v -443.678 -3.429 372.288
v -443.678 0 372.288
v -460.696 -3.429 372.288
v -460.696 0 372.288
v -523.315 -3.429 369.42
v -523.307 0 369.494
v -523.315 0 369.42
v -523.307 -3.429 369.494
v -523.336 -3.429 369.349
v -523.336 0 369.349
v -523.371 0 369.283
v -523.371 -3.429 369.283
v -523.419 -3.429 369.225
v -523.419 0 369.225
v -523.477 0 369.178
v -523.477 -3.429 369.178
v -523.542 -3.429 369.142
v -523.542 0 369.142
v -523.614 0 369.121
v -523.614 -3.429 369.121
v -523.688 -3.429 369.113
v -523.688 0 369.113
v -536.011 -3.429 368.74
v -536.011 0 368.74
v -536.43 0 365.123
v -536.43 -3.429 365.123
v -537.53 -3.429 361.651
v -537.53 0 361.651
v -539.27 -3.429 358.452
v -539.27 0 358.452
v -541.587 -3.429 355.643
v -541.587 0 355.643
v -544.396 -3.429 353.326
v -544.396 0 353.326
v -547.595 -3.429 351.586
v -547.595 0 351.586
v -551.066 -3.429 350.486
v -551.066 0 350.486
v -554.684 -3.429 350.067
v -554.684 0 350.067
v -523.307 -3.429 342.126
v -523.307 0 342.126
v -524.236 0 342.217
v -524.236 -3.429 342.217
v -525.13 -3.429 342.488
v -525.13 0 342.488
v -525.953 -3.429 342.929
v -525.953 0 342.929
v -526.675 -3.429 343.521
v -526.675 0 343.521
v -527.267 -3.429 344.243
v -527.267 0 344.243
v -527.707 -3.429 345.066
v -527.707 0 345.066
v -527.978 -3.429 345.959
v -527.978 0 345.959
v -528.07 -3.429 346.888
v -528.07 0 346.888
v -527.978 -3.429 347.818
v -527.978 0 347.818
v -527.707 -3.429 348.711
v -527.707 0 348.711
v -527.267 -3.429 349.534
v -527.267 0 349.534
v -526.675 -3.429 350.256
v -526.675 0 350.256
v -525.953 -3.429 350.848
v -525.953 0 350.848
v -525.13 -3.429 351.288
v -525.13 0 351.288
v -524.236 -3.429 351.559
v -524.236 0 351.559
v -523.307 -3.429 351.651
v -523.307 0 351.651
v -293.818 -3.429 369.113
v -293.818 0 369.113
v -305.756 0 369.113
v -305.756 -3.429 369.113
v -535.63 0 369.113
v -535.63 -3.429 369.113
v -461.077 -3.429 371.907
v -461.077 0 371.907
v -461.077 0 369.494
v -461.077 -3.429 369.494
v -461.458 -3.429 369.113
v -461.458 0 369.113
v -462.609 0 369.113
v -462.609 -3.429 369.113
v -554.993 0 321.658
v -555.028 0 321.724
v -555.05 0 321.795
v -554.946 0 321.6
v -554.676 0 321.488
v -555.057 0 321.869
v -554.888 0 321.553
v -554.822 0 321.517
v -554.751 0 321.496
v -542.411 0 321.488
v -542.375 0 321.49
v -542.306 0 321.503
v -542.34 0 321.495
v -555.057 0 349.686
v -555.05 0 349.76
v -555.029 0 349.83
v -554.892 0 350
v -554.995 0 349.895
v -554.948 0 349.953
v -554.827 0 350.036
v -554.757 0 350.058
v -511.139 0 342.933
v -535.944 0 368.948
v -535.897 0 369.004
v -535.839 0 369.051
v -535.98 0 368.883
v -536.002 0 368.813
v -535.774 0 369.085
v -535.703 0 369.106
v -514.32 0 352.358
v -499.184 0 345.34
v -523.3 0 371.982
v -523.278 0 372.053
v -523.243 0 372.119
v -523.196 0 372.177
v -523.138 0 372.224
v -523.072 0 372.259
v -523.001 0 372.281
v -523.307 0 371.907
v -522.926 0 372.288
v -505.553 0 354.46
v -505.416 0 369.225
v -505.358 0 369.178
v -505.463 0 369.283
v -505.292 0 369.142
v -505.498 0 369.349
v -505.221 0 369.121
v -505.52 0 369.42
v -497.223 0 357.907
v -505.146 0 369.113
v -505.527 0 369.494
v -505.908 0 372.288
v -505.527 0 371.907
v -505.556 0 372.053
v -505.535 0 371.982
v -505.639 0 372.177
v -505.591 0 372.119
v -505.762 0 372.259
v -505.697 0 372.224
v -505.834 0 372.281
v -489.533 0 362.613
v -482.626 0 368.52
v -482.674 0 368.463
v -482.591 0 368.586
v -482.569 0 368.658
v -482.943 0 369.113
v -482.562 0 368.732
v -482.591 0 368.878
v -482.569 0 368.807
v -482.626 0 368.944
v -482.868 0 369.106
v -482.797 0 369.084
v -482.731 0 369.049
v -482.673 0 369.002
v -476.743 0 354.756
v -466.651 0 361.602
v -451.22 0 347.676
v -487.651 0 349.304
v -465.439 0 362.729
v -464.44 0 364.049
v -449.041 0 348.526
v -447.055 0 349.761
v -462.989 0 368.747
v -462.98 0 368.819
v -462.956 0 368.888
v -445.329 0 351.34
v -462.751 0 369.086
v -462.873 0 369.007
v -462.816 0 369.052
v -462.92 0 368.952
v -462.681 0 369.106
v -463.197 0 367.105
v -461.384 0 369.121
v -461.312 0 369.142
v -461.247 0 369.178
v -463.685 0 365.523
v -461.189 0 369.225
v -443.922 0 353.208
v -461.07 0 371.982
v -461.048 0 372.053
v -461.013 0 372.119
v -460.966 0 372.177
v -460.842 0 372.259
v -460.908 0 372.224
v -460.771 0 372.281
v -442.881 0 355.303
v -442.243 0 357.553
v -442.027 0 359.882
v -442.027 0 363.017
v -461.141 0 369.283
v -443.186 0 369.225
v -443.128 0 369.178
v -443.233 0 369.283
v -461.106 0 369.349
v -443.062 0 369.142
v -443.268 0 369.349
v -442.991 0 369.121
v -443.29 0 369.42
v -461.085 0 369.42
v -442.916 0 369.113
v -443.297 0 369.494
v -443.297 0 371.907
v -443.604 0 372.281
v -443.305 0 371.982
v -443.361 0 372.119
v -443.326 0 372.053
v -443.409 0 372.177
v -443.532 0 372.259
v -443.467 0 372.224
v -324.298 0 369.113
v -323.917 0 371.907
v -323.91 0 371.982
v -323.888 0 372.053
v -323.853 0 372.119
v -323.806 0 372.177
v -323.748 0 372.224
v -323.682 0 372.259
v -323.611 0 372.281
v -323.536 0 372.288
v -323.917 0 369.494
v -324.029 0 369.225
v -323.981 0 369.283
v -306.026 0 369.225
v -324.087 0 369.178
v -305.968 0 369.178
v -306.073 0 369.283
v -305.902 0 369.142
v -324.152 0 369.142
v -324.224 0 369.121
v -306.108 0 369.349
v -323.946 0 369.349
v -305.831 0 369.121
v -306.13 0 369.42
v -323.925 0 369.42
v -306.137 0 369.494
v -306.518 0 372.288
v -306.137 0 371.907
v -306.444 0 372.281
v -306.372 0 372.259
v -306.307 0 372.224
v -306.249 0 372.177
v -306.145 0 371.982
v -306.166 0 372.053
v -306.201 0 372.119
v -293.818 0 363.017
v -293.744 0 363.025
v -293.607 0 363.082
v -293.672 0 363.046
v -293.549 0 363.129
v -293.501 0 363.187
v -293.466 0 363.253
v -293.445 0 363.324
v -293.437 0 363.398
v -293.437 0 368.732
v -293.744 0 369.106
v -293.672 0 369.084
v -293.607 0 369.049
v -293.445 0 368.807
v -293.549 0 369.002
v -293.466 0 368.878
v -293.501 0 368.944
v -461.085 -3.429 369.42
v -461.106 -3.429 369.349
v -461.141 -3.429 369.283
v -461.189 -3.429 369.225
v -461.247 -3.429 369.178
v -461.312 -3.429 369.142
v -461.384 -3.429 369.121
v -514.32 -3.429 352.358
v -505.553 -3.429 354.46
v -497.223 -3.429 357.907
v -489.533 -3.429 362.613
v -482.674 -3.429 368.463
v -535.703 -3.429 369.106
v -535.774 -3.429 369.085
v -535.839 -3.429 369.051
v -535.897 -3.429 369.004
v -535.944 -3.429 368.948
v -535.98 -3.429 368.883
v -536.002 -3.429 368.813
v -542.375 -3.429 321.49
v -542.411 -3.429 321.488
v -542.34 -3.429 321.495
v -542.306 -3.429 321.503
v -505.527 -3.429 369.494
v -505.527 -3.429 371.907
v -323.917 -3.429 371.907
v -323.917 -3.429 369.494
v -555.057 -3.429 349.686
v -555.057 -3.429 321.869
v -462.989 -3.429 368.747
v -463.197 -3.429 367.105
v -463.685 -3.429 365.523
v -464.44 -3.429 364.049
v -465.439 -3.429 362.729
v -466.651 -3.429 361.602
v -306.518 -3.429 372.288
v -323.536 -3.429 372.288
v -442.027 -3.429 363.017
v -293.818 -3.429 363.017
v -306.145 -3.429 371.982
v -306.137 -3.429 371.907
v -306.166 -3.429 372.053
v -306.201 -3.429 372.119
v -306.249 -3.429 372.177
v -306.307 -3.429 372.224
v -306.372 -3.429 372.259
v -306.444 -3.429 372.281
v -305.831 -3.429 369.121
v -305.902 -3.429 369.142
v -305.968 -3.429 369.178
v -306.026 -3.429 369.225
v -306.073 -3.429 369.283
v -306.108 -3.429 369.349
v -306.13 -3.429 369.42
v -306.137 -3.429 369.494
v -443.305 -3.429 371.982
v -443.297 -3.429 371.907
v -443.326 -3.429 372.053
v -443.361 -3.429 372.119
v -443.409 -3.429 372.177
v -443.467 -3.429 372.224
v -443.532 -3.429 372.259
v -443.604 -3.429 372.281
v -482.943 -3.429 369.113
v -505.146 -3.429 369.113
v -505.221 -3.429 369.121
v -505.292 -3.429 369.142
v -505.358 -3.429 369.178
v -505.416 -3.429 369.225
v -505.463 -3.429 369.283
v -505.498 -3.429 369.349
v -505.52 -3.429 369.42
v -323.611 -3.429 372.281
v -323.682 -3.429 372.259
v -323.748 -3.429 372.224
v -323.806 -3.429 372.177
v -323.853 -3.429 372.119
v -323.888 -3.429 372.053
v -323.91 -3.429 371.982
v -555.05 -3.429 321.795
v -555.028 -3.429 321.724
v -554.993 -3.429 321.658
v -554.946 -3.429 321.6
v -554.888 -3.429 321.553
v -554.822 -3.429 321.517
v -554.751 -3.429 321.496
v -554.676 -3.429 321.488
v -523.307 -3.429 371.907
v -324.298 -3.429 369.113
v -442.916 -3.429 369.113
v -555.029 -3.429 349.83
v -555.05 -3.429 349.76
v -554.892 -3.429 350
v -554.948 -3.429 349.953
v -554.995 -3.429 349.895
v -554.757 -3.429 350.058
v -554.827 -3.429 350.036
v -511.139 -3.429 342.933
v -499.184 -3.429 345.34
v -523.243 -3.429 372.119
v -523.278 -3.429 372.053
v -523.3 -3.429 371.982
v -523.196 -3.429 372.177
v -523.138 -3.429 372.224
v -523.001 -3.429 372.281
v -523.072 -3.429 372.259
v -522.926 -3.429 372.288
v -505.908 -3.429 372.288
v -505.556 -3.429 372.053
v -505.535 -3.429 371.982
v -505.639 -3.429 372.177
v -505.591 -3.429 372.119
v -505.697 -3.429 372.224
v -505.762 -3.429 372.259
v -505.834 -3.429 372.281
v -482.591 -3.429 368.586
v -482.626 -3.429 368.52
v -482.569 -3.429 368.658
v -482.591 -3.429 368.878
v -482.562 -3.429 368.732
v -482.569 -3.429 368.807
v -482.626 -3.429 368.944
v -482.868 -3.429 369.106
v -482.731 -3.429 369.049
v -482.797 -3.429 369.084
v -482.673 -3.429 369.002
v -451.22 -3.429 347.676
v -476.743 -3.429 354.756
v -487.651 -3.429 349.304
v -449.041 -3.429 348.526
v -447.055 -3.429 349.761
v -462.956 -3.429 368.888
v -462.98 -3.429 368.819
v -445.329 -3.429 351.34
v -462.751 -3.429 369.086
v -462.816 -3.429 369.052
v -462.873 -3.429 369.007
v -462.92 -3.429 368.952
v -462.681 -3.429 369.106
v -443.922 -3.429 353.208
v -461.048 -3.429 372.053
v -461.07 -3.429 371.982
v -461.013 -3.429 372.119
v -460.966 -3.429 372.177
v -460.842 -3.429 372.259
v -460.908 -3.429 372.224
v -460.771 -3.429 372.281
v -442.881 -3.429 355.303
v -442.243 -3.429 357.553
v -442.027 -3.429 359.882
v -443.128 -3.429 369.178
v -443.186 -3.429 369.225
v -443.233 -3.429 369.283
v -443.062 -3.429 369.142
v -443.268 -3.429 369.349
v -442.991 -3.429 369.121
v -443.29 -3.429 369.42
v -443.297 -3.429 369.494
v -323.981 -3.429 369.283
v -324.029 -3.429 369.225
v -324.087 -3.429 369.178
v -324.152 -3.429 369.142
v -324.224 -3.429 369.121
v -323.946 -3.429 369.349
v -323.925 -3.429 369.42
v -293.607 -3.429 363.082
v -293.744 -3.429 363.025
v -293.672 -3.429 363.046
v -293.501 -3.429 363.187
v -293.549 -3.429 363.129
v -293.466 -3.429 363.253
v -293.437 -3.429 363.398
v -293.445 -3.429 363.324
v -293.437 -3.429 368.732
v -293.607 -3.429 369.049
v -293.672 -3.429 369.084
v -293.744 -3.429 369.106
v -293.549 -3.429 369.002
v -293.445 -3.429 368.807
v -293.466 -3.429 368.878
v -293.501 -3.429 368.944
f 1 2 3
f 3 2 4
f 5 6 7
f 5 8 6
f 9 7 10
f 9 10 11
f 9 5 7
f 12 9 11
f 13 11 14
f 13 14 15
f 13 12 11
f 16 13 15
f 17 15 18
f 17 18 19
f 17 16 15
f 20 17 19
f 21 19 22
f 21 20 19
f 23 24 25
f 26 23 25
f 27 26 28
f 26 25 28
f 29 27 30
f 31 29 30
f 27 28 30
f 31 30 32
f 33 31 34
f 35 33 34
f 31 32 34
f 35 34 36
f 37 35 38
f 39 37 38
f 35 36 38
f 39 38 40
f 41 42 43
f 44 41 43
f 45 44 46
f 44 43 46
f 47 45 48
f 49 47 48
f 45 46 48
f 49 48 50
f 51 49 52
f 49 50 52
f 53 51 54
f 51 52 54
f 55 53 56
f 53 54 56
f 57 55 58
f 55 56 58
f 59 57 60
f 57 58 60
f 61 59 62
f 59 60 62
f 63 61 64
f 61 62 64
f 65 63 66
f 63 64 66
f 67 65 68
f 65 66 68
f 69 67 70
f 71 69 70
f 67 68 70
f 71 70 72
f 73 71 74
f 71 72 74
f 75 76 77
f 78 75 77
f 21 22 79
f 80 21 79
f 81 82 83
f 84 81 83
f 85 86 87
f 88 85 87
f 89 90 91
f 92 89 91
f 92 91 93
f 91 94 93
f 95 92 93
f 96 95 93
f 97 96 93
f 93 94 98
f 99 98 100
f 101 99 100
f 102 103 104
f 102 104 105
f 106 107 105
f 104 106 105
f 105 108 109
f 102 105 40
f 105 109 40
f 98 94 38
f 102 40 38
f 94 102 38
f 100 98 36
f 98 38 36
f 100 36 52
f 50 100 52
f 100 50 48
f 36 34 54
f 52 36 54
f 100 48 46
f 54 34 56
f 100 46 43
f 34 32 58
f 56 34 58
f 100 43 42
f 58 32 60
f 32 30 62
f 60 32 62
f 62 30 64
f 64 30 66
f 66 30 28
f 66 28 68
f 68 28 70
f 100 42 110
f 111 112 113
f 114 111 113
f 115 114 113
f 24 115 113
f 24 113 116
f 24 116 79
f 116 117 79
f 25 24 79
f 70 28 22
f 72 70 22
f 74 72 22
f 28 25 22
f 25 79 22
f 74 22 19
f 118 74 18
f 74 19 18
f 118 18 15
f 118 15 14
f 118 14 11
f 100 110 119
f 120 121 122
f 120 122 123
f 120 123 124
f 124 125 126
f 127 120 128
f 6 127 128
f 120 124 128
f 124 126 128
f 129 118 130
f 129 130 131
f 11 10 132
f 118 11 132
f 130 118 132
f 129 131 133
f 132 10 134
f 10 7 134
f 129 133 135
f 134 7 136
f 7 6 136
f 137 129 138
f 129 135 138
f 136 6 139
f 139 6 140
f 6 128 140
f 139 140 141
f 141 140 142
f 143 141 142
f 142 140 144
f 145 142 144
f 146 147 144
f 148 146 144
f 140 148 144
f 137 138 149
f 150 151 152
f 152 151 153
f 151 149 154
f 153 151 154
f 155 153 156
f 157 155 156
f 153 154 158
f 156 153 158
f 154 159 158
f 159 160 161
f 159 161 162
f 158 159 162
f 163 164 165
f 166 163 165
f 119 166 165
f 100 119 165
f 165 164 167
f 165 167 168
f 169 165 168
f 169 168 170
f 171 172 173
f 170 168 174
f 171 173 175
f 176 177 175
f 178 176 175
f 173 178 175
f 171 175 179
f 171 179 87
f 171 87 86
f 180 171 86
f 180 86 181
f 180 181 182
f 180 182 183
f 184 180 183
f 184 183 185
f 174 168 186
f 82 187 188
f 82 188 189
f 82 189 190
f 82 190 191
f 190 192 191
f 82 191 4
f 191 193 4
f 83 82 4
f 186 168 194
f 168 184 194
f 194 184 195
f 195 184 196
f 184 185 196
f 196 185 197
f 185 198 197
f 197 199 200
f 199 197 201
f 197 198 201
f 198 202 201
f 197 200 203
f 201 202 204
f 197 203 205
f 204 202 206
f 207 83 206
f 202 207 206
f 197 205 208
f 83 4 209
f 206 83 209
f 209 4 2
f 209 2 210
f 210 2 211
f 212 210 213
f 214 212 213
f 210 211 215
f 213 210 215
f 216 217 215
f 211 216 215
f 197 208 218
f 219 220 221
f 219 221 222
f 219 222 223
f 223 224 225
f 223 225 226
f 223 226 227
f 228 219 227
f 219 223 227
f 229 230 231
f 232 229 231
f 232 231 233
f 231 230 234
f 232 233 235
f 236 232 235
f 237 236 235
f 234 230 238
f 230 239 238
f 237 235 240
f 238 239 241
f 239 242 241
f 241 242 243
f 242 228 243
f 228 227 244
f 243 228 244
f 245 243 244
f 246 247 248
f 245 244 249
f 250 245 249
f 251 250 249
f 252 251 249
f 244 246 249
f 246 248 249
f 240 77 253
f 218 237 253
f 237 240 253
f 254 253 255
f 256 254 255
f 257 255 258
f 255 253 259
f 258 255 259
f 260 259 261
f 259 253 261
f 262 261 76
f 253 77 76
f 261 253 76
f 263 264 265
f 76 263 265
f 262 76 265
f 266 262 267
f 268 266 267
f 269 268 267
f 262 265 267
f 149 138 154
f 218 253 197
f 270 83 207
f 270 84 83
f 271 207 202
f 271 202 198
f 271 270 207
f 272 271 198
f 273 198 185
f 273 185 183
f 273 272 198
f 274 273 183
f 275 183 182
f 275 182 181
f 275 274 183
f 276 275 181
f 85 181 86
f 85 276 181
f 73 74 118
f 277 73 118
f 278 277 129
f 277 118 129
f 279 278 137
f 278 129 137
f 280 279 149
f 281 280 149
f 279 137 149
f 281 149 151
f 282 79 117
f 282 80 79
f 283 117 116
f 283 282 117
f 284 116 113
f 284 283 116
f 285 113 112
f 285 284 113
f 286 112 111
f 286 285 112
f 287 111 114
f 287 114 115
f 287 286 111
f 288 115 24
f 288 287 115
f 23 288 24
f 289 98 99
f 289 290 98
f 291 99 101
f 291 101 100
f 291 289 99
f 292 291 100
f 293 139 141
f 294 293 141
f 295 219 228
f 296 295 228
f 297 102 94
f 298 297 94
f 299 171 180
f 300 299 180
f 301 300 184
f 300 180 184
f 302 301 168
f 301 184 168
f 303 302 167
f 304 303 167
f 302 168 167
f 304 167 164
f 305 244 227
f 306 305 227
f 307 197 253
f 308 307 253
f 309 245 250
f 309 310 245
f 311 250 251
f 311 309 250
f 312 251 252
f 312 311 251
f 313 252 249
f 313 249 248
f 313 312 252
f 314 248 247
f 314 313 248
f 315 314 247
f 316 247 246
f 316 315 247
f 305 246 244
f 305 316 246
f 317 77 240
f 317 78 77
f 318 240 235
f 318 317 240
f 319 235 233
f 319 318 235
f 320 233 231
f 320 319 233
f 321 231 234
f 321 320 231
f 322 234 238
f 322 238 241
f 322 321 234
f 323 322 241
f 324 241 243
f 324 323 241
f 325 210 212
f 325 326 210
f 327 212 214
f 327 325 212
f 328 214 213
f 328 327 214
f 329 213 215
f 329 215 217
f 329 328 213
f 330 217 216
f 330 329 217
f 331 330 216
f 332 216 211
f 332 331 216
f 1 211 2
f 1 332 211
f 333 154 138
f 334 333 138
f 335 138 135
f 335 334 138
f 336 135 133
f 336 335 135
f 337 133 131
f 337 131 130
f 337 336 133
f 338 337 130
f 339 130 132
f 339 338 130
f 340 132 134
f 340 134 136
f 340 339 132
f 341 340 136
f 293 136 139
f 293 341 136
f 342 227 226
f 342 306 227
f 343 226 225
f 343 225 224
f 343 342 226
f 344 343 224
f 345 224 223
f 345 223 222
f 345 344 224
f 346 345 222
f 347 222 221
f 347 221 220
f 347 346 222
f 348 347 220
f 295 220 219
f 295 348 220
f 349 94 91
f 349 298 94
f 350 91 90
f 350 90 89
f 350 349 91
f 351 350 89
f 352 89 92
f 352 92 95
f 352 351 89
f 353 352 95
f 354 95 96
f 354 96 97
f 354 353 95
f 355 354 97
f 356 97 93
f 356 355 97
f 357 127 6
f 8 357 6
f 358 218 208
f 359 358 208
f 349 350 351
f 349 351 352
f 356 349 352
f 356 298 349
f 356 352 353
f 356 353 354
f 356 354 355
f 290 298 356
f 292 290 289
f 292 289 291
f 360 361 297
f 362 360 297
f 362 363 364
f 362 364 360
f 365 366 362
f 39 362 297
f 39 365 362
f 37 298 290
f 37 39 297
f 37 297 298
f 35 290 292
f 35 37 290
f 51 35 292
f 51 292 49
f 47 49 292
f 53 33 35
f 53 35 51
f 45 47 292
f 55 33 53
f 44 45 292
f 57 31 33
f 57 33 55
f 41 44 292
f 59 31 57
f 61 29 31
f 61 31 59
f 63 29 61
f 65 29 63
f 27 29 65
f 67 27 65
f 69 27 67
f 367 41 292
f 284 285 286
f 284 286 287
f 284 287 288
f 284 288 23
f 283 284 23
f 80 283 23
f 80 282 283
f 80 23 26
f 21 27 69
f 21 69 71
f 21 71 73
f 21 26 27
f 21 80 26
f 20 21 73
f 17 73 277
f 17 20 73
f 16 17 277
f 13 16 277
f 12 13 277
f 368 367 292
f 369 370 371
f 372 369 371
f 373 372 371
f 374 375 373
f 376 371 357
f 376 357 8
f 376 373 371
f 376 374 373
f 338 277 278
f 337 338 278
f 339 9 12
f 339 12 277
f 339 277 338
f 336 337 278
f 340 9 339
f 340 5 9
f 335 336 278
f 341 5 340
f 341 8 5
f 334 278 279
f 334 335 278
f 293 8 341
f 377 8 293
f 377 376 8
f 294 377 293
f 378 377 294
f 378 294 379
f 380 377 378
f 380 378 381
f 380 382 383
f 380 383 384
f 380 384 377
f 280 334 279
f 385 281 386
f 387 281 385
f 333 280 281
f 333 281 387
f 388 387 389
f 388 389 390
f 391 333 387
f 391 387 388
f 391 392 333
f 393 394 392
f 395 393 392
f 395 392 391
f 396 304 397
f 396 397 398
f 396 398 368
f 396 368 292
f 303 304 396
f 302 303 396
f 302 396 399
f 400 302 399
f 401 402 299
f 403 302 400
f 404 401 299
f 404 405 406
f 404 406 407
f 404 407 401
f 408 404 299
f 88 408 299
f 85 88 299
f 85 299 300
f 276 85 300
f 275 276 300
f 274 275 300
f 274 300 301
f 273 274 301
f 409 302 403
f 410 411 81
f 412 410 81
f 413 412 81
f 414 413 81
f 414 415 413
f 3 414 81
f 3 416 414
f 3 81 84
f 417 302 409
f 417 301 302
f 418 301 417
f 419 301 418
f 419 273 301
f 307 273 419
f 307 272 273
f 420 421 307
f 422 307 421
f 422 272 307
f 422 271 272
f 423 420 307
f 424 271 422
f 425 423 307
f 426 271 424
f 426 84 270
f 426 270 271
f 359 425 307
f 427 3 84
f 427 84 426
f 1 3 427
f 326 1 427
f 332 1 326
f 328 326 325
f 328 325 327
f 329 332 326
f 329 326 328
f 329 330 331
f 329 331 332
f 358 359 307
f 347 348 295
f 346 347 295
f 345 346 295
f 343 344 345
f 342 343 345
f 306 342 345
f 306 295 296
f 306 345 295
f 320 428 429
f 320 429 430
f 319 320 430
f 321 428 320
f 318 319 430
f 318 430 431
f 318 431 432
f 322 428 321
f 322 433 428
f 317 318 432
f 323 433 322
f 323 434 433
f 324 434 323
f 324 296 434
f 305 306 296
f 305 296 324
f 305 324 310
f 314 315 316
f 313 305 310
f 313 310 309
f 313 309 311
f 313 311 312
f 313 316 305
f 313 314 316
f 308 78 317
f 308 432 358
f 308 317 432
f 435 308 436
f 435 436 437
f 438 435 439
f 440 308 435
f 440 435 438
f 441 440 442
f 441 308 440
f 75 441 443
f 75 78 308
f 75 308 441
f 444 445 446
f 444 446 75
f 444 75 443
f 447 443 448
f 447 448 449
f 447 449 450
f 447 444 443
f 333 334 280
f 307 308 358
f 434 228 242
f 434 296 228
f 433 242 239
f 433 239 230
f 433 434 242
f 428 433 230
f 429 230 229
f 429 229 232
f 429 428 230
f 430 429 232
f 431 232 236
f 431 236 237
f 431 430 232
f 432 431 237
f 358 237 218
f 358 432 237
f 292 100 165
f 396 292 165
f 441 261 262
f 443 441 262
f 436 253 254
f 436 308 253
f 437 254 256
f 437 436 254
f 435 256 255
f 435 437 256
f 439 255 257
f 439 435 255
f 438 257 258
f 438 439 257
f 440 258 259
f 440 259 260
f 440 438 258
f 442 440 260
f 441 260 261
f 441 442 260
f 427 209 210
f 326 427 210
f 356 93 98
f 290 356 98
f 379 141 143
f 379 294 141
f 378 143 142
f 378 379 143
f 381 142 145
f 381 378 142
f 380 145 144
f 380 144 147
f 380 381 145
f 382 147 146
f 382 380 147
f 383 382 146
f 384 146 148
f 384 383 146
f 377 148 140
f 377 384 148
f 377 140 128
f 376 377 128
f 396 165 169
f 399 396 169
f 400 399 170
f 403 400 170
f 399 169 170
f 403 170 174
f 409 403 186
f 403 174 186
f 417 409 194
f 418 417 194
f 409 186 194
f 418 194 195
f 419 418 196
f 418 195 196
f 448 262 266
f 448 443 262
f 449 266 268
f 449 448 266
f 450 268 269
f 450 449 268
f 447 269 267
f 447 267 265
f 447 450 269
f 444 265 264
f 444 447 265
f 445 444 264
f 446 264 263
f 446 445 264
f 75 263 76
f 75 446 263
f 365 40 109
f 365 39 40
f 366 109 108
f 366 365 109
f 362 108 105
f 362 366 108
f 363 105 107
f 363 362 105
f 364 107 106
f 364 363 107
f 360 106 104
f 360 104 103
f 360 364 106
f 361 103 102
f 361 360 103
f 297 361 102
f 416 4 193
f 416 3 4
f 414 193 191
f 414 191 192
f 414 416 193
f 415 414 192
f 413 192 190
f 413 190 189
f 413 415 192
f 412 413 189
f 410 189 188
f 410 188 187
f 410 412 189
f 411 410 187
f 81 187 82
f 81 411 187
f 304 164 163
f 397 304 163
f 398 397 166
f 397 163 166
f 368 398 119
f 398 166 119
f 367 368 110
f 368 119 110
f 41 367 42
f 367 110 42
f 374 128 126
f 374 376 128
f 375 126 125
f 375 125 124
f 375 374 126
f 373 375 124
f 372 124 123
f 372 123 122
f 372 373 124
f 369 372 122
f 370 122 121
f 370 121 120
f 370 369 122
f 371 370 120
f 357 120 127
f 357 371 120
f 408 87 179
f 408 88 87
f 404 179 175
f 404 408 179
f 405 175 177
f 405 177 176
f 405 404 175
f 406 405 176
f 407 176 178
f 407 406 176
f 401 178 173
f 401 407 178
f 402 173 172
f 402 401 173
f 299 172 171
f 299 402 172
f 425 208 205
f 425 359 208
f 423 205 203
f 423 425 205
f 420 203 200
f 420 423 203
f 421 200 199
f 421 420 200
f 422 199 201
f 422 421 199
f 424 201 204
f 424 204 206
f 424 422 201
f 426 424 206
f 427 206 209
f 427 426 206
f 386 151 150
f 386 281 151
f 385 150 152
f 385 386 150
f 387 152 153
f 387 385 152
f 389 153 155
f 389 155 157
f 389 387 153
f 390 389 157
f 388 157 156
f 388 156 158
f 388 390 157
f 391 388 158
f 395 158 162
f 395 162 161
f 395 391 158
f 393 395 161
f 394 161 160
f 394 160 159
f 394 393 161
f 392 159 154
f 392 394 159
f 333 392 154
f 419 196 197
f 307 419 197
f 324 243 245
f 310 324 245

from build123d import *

# Parameters (mm, degrees)
F1_DEPTH = 3.429
F2_R     = 0.381


# Not quite as in the source:
# - ends of sketch curves that miss each other by under 0.0002 mm in the source are joined


with BuildPart() as f1:
    # F0 (on Front) → F1 (new body)
    with BuildSketch(Plane.XZ):
        with BuildLine():
            ThreePointArc((-523.3072592, 342.1259096), (-528.0697592, 346.8884096), (-523.3072592, 351.6509096))
            ThreePointArc((-523.3072592, 351.6509096), (-500.8987443088, 356.1961233076), (-482.0322439898, 369.1133948419))
            Line((-482.0322439898, 369.1133948419), (-505.5272592, 369.1134096))
            Line((-505.5272592, 369.1134096), (-505.5272592, 372.2884096))
            Line((-505.5272592, 372.2884096), (-523.3072592, 372.2884096))
            Line((-523.3072592, 372.2884096), (-523.3072592, 369.1134096))
            Line((-523.3072592, 369.1134096), (-536.0072592, 369.1134096))
            ThreePointArc((-536.0072592, 369.1134096), (-541.5868750184, 355.6430254184), (-555.0572592, 350.0634096))
            Line((-555.0572592, 350.0634096), (-555.0572592, 321.4884096))
            Line((-555.0572592, 321.4884096), (-542.3572592, 321.4884096))
            Line((-542.3572592, 321.4884096), (-451.219951, 347.675962))
            ThreePointArc((-451.219951, 347.675962), (-444.5824868492, 352.2417976203), (-442.0272592, 359.882059))
            Line((-442.0272592, 359.882059), (-442.0272592, 363.0174096))
            Line((-442.0272592, 363.0174096), (-293.4372592, 363.0174096))
            Line((-293.4372592, 363.0174096), (-293.4372592, 369.1134096))
            Line((-293.4372592, 369.1134096), (-306.1372592, 369.1134096))
            Line((-306.1372592, 369.1134096), (-306.1372592, 372.2884096))
            Line((-306.1372592, 372.2884096), (-323.9172592, 372.2884096))
            Line((-323.9172592, 372.2884096), (-323.9172592, 369.1134096))
            Line((-323.9172592, 369.1134096), (-443.2972592, 369.1134096))
            Line((-443.2972592, 369.1134096), (-443.2972592, 372.2884096))
            Line((-443.2972592, 372.2884096), (-461.0772592, 372.2884096))
            Line((-461.0772592, 372.2884096), (-461.0772592, 369.1134096))
            Line((-461.0772592, 369.1134096), (-462.9822592, 369.1134096))
            ThreePointArc((-462.9822592, 369.1134096), (-463.9484088233, 364.9334927075), (-466.650858723, 361.601539097))
            ThreePointArc((-466.650858723, 361.601539097), (-493.3520932085, 347.1307312076), (-523.3072592, 342.1259096))
        make_face()
    extrude(amount=F1_DEPTH)

    # F2
    f2_edges = [f1.edges().sort_by_distance(p)[0] for p in [
        (-482.032244, -1.7145, 369.113395),
        (-461.077259, -1.7145, 372.28841),
        (-461.077259, -1.7145, 369.11341),
        (-462.982259, -1.7145, 369.11341),
        (-505.527259, -1.7145, 372.28841),
        (-523.307259, -1.7145, 372.28841),
        (-523.307259, -1.7145, 369.11341),
        (-536.007259, -1.7145, 369.11341),
        (-505.527259, -1.7145, 369.11341),
        (-555.057259, -1.7145, 350.06341),
        (-443.297259, -1.7145, 369.11341),
        (-443.297259, -1.7145, 372.28841),
        (-323.917259, -1.7145, 372.28841),
        (-306.137259, -1.7145, 372.28841),
        (-306.137259, -1.7145, 369.11341),
        (-323.917259, -1.7145, 369.11341),
        (-293.437259, -1.7145, 369.11341),
        (-293.437259, -1.7145, 363.01741),
        (-542.357259, -1.7145, 321.48841),
        (-555.057259, -1.7145, 321.48841),
    ]]
    fillet(f2_edges, radius=F2_R)


solid = f1.part
